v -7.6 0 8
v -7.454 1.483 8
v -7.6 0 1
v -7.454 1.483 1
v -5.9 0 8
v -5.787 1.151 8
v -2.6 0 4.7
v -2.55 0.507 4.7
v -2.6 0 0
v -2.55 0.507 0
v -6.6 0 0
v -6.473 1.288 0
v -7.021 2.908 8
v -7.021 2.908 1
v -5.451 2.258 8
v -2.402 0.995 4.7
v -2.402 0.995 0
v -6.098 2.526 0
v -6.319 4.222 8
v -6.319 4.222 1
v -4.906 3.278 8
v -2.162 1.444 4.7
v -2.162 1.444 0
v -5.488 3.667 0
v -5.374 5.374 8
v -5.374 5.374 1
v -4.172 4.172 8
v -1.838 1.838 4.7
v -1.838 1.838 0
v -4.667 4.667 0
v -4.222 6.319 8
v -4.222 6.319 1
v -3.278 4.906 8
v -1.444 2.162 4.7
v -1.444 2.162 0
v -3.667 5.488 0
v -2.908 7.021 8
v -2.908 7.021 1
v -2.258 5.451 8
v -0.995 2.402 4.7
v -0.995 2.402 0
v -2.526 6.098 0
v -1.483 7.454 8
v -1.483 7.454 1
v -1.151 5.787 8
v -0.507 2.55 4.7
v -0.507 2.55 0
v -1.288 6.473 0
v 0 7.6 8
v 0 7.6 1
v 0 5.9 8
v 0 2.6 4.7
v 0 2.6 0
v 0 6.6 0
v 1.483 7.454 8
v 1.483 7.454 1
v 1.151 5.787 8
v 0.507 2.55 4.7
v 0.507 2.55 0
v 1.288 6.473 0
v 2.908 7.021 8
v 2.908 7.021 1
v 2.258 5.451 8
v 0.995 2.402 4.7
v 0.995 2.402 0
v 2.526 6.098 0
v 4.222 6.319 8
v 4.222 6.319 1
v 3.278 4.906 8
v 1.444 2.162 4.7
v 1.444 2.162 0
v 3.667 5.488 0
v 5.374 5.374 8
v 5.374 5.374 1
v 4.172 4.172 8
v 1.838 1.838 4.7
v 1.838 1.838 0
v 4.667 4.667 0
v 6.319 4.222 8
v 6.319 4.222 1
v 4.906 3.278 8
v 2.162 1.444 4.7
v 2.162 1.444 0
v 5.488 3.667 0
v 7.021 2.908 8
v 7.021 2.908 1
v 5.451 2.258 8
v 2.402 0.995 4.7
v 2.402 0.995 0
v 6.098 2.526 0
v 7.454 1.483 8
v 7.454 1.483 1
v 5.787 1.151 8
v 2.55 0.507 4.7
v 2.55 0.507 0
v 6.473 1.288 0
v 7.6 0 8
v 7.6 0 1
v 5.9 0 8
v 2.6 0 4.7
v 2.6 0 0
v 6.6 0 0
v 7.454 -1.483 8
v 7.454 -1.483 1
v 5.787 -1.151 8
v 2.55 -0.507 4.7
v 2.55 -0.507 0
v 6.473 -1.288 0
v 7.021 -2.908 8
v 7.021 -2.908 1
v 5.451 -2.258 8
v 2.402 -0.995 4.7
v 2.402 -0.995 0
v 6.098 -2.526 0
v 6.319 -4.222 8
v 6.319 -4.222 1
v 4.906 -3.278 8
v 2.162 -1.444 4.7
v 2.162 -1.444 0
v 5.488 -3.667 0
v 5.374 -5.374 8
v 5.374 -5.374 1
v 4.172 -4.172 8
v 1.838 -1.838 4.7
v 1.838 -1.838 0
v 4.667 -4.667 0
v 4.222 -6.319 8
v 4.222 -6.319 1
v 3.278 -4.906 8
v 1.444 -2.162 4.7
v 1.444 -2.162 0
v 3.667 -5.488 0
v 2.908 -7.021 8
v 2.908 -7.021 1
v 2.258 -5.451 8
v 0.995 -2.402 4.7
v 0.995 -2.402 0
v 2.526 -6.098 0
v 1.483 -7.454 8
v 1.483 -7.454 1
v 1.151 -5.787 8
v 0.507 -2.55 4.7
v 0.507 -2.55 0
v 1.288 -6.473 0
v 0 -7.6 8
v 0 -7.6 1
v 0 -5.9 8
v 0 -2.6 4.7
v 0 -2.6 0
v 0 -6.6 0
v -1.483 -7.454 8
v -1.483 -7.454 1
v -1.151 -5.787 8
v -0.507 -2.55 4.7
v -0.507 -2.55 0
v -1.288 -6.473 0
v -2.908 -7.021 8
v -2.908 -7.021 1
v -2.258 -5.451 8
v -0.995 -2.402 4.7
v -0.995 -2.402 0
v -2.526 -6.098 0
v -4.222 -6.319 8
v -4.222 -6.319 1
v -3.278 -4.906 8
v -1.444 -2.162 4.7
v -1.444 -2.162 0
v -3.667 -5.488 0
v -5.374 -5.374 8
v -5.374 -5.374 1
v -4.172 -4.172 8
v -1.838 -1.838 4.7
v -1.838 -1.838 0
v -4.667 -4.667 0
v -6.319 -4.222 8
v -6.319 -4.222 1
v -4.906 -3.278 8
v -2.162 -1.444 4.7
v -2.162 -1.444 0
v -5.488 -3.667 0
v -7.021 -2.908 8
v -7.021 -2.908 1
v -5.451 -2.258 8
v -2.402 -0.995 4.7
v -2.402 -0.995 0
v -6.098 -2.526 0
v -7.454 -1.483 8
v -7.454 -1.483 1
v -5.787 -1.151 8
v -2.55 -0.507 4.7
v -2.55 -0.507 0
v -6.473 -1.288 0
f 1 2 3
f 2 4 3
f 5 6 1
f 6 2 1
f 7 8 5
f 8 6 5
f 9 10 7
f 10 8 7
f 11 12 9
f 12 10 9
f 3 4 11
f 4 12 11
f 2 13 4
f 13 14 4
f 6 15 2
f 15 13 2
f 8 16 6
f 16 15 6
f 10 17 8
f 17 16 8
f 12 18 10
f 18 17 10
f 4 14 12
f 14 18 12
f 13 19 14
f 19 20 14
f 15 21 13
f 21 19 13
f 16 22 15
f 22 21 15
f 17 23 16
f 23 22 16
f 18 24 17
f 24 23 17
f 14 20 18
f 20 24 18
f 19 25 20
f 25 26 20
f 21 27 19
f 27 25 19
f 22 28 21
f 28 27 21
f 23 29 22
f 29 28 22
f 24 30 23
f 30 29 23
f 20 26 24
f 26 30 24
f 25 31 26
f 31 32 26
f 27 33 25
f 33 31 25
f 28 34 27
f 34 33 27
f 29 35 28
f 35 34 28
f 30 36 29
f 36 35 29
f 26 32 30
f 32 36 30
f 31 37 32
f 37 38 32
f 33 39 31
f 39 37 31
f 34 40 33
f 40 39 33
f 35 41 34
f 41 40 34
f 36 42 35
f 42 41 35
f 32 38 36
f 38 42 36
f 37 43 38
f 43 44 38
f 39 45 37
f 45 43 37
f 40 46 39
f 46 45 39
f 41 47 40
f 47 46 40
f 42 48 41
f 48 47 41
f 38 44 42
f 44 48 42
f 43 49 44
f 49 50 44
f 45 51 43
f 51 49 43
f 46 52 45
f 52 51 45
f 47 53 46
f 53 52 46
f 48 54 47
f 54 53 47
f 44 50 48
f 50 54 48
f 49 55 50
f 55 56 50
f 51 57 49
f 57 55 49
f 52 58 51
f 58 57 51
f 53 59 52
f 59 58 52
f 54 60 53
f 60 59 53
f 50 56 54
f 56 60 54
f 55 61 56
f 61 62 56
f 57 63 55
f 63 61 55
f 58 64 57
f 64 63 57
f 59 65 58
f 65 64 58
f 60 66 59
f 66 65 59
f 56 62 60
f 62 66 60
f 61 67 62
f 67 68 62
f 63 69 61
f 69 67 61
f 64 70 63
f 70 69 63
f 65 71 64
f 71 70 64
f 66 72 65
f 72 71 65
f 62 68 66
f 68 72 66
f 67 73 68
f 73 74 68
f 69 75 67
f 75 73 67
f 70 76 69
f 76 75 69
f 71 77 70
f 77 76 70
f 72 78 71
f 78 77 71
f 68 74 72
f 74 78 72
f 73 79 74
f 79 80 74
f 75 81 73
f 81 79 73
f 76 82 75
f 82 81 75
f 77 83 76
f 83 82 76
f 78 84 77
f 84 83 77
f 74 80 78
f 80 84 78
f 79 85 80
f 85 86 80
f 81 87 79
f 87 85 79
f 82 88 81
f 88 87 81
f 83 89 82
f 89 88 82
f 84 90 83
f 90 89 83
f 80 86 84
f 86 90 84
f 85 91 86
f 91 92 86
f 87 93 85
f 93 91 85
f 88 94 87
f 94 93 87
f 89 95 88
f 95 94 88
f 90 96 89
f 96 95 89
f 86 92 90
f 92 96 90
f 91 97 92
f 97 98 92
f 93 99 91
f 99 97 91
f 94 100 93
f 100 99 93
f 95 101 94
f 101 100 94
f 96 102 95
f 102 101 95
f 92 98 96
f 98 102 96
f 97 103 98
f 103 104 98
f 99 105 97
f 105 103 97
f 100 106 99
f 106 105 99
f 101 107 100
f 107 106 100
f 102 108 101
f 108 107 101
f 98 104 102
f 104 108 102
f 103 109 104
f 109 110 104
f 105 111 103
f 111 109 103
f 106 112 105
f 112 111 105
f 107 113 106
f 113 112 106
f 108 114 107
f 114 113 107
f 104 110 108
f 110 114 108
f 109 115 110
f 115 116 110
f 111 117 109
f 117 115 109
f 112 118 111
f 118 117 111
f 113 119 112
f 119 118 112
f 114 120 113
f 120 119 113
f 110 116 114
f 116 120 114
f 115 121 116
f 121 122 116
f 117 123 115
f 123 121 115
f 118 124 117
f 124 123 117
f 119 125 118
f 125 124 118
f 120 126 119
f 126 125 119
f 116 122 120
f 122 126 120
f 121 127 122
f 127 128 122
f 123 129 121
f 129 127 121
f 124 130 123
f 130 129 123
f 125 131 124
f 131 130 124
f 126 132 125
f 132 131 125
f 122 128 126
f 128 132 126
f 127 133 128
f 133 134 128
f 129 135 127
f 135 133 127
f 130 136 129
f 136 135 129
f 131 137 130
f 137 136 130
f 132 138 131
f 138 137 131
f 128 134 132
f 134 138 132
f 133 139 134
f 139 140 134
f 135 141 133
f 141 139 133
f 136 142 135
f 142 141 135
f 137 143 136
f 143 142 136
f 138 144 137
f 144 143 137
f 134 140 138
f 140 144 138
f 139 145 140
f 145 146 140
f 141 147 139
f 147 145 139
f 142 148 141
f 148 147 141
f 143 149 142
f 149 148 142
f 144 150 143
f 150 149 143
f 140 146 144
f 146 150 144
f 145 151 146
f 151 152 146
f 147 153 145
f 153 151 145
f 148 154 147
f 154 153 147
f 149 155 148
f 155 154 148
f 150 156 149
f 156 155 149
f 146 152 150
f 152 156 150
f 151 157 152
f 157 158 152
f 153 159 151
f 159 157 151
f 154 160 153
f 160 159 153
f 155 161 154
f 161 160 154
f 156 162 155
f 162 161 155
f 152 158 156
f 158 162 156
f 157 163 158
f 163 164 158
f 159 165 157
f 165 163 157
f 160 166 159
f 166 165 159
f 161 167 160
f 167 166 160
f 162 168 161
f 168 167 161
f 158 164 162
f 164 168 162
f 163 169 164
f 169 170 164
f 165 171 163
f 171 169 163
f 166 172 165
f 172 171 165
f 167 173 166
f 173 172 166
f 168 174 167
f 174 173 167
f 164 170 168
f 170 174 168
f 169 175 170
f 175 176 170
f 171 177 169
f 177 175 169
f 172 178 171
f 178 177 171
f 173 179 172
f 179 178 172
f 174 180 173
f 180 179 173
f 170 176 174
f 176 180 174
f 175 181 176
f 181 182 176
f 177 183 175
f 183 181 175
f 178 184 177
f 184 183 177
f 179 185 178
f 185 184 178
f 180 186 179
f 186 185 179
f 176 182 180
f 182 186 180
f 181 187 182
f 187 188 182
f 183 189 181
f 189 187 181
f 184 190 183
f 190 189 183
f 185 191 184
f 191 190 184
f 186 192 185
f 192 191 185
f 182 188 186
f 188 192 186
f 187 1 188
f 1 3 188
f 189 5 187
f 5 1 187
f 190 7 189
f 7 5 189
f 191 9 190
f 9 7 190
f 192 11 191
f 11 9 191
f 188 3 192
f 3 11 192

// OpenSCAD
$fn = 32;

// ----------------------------------------------------------------------
// Form washer: countersunk washer, 15.2 mm outside, 5.2 mm bore
// ----------------------------------------------------------------------

// --- parameters (mm) ---
revolve_angle = 360;      // full turn around the Z axis
profile_points = 6;       // points of the closed outline

profile = [[2.6, 0], [6.6, 0], [7.6, 1], [7.6, 8], [5.9, 8], [2.6, 4.7]];  // single closed polygon, 6 points, counter clockwise

// --- the one profile operation ---
rotate_extrude(angle = revolve_angle) polygon(points = profile);
